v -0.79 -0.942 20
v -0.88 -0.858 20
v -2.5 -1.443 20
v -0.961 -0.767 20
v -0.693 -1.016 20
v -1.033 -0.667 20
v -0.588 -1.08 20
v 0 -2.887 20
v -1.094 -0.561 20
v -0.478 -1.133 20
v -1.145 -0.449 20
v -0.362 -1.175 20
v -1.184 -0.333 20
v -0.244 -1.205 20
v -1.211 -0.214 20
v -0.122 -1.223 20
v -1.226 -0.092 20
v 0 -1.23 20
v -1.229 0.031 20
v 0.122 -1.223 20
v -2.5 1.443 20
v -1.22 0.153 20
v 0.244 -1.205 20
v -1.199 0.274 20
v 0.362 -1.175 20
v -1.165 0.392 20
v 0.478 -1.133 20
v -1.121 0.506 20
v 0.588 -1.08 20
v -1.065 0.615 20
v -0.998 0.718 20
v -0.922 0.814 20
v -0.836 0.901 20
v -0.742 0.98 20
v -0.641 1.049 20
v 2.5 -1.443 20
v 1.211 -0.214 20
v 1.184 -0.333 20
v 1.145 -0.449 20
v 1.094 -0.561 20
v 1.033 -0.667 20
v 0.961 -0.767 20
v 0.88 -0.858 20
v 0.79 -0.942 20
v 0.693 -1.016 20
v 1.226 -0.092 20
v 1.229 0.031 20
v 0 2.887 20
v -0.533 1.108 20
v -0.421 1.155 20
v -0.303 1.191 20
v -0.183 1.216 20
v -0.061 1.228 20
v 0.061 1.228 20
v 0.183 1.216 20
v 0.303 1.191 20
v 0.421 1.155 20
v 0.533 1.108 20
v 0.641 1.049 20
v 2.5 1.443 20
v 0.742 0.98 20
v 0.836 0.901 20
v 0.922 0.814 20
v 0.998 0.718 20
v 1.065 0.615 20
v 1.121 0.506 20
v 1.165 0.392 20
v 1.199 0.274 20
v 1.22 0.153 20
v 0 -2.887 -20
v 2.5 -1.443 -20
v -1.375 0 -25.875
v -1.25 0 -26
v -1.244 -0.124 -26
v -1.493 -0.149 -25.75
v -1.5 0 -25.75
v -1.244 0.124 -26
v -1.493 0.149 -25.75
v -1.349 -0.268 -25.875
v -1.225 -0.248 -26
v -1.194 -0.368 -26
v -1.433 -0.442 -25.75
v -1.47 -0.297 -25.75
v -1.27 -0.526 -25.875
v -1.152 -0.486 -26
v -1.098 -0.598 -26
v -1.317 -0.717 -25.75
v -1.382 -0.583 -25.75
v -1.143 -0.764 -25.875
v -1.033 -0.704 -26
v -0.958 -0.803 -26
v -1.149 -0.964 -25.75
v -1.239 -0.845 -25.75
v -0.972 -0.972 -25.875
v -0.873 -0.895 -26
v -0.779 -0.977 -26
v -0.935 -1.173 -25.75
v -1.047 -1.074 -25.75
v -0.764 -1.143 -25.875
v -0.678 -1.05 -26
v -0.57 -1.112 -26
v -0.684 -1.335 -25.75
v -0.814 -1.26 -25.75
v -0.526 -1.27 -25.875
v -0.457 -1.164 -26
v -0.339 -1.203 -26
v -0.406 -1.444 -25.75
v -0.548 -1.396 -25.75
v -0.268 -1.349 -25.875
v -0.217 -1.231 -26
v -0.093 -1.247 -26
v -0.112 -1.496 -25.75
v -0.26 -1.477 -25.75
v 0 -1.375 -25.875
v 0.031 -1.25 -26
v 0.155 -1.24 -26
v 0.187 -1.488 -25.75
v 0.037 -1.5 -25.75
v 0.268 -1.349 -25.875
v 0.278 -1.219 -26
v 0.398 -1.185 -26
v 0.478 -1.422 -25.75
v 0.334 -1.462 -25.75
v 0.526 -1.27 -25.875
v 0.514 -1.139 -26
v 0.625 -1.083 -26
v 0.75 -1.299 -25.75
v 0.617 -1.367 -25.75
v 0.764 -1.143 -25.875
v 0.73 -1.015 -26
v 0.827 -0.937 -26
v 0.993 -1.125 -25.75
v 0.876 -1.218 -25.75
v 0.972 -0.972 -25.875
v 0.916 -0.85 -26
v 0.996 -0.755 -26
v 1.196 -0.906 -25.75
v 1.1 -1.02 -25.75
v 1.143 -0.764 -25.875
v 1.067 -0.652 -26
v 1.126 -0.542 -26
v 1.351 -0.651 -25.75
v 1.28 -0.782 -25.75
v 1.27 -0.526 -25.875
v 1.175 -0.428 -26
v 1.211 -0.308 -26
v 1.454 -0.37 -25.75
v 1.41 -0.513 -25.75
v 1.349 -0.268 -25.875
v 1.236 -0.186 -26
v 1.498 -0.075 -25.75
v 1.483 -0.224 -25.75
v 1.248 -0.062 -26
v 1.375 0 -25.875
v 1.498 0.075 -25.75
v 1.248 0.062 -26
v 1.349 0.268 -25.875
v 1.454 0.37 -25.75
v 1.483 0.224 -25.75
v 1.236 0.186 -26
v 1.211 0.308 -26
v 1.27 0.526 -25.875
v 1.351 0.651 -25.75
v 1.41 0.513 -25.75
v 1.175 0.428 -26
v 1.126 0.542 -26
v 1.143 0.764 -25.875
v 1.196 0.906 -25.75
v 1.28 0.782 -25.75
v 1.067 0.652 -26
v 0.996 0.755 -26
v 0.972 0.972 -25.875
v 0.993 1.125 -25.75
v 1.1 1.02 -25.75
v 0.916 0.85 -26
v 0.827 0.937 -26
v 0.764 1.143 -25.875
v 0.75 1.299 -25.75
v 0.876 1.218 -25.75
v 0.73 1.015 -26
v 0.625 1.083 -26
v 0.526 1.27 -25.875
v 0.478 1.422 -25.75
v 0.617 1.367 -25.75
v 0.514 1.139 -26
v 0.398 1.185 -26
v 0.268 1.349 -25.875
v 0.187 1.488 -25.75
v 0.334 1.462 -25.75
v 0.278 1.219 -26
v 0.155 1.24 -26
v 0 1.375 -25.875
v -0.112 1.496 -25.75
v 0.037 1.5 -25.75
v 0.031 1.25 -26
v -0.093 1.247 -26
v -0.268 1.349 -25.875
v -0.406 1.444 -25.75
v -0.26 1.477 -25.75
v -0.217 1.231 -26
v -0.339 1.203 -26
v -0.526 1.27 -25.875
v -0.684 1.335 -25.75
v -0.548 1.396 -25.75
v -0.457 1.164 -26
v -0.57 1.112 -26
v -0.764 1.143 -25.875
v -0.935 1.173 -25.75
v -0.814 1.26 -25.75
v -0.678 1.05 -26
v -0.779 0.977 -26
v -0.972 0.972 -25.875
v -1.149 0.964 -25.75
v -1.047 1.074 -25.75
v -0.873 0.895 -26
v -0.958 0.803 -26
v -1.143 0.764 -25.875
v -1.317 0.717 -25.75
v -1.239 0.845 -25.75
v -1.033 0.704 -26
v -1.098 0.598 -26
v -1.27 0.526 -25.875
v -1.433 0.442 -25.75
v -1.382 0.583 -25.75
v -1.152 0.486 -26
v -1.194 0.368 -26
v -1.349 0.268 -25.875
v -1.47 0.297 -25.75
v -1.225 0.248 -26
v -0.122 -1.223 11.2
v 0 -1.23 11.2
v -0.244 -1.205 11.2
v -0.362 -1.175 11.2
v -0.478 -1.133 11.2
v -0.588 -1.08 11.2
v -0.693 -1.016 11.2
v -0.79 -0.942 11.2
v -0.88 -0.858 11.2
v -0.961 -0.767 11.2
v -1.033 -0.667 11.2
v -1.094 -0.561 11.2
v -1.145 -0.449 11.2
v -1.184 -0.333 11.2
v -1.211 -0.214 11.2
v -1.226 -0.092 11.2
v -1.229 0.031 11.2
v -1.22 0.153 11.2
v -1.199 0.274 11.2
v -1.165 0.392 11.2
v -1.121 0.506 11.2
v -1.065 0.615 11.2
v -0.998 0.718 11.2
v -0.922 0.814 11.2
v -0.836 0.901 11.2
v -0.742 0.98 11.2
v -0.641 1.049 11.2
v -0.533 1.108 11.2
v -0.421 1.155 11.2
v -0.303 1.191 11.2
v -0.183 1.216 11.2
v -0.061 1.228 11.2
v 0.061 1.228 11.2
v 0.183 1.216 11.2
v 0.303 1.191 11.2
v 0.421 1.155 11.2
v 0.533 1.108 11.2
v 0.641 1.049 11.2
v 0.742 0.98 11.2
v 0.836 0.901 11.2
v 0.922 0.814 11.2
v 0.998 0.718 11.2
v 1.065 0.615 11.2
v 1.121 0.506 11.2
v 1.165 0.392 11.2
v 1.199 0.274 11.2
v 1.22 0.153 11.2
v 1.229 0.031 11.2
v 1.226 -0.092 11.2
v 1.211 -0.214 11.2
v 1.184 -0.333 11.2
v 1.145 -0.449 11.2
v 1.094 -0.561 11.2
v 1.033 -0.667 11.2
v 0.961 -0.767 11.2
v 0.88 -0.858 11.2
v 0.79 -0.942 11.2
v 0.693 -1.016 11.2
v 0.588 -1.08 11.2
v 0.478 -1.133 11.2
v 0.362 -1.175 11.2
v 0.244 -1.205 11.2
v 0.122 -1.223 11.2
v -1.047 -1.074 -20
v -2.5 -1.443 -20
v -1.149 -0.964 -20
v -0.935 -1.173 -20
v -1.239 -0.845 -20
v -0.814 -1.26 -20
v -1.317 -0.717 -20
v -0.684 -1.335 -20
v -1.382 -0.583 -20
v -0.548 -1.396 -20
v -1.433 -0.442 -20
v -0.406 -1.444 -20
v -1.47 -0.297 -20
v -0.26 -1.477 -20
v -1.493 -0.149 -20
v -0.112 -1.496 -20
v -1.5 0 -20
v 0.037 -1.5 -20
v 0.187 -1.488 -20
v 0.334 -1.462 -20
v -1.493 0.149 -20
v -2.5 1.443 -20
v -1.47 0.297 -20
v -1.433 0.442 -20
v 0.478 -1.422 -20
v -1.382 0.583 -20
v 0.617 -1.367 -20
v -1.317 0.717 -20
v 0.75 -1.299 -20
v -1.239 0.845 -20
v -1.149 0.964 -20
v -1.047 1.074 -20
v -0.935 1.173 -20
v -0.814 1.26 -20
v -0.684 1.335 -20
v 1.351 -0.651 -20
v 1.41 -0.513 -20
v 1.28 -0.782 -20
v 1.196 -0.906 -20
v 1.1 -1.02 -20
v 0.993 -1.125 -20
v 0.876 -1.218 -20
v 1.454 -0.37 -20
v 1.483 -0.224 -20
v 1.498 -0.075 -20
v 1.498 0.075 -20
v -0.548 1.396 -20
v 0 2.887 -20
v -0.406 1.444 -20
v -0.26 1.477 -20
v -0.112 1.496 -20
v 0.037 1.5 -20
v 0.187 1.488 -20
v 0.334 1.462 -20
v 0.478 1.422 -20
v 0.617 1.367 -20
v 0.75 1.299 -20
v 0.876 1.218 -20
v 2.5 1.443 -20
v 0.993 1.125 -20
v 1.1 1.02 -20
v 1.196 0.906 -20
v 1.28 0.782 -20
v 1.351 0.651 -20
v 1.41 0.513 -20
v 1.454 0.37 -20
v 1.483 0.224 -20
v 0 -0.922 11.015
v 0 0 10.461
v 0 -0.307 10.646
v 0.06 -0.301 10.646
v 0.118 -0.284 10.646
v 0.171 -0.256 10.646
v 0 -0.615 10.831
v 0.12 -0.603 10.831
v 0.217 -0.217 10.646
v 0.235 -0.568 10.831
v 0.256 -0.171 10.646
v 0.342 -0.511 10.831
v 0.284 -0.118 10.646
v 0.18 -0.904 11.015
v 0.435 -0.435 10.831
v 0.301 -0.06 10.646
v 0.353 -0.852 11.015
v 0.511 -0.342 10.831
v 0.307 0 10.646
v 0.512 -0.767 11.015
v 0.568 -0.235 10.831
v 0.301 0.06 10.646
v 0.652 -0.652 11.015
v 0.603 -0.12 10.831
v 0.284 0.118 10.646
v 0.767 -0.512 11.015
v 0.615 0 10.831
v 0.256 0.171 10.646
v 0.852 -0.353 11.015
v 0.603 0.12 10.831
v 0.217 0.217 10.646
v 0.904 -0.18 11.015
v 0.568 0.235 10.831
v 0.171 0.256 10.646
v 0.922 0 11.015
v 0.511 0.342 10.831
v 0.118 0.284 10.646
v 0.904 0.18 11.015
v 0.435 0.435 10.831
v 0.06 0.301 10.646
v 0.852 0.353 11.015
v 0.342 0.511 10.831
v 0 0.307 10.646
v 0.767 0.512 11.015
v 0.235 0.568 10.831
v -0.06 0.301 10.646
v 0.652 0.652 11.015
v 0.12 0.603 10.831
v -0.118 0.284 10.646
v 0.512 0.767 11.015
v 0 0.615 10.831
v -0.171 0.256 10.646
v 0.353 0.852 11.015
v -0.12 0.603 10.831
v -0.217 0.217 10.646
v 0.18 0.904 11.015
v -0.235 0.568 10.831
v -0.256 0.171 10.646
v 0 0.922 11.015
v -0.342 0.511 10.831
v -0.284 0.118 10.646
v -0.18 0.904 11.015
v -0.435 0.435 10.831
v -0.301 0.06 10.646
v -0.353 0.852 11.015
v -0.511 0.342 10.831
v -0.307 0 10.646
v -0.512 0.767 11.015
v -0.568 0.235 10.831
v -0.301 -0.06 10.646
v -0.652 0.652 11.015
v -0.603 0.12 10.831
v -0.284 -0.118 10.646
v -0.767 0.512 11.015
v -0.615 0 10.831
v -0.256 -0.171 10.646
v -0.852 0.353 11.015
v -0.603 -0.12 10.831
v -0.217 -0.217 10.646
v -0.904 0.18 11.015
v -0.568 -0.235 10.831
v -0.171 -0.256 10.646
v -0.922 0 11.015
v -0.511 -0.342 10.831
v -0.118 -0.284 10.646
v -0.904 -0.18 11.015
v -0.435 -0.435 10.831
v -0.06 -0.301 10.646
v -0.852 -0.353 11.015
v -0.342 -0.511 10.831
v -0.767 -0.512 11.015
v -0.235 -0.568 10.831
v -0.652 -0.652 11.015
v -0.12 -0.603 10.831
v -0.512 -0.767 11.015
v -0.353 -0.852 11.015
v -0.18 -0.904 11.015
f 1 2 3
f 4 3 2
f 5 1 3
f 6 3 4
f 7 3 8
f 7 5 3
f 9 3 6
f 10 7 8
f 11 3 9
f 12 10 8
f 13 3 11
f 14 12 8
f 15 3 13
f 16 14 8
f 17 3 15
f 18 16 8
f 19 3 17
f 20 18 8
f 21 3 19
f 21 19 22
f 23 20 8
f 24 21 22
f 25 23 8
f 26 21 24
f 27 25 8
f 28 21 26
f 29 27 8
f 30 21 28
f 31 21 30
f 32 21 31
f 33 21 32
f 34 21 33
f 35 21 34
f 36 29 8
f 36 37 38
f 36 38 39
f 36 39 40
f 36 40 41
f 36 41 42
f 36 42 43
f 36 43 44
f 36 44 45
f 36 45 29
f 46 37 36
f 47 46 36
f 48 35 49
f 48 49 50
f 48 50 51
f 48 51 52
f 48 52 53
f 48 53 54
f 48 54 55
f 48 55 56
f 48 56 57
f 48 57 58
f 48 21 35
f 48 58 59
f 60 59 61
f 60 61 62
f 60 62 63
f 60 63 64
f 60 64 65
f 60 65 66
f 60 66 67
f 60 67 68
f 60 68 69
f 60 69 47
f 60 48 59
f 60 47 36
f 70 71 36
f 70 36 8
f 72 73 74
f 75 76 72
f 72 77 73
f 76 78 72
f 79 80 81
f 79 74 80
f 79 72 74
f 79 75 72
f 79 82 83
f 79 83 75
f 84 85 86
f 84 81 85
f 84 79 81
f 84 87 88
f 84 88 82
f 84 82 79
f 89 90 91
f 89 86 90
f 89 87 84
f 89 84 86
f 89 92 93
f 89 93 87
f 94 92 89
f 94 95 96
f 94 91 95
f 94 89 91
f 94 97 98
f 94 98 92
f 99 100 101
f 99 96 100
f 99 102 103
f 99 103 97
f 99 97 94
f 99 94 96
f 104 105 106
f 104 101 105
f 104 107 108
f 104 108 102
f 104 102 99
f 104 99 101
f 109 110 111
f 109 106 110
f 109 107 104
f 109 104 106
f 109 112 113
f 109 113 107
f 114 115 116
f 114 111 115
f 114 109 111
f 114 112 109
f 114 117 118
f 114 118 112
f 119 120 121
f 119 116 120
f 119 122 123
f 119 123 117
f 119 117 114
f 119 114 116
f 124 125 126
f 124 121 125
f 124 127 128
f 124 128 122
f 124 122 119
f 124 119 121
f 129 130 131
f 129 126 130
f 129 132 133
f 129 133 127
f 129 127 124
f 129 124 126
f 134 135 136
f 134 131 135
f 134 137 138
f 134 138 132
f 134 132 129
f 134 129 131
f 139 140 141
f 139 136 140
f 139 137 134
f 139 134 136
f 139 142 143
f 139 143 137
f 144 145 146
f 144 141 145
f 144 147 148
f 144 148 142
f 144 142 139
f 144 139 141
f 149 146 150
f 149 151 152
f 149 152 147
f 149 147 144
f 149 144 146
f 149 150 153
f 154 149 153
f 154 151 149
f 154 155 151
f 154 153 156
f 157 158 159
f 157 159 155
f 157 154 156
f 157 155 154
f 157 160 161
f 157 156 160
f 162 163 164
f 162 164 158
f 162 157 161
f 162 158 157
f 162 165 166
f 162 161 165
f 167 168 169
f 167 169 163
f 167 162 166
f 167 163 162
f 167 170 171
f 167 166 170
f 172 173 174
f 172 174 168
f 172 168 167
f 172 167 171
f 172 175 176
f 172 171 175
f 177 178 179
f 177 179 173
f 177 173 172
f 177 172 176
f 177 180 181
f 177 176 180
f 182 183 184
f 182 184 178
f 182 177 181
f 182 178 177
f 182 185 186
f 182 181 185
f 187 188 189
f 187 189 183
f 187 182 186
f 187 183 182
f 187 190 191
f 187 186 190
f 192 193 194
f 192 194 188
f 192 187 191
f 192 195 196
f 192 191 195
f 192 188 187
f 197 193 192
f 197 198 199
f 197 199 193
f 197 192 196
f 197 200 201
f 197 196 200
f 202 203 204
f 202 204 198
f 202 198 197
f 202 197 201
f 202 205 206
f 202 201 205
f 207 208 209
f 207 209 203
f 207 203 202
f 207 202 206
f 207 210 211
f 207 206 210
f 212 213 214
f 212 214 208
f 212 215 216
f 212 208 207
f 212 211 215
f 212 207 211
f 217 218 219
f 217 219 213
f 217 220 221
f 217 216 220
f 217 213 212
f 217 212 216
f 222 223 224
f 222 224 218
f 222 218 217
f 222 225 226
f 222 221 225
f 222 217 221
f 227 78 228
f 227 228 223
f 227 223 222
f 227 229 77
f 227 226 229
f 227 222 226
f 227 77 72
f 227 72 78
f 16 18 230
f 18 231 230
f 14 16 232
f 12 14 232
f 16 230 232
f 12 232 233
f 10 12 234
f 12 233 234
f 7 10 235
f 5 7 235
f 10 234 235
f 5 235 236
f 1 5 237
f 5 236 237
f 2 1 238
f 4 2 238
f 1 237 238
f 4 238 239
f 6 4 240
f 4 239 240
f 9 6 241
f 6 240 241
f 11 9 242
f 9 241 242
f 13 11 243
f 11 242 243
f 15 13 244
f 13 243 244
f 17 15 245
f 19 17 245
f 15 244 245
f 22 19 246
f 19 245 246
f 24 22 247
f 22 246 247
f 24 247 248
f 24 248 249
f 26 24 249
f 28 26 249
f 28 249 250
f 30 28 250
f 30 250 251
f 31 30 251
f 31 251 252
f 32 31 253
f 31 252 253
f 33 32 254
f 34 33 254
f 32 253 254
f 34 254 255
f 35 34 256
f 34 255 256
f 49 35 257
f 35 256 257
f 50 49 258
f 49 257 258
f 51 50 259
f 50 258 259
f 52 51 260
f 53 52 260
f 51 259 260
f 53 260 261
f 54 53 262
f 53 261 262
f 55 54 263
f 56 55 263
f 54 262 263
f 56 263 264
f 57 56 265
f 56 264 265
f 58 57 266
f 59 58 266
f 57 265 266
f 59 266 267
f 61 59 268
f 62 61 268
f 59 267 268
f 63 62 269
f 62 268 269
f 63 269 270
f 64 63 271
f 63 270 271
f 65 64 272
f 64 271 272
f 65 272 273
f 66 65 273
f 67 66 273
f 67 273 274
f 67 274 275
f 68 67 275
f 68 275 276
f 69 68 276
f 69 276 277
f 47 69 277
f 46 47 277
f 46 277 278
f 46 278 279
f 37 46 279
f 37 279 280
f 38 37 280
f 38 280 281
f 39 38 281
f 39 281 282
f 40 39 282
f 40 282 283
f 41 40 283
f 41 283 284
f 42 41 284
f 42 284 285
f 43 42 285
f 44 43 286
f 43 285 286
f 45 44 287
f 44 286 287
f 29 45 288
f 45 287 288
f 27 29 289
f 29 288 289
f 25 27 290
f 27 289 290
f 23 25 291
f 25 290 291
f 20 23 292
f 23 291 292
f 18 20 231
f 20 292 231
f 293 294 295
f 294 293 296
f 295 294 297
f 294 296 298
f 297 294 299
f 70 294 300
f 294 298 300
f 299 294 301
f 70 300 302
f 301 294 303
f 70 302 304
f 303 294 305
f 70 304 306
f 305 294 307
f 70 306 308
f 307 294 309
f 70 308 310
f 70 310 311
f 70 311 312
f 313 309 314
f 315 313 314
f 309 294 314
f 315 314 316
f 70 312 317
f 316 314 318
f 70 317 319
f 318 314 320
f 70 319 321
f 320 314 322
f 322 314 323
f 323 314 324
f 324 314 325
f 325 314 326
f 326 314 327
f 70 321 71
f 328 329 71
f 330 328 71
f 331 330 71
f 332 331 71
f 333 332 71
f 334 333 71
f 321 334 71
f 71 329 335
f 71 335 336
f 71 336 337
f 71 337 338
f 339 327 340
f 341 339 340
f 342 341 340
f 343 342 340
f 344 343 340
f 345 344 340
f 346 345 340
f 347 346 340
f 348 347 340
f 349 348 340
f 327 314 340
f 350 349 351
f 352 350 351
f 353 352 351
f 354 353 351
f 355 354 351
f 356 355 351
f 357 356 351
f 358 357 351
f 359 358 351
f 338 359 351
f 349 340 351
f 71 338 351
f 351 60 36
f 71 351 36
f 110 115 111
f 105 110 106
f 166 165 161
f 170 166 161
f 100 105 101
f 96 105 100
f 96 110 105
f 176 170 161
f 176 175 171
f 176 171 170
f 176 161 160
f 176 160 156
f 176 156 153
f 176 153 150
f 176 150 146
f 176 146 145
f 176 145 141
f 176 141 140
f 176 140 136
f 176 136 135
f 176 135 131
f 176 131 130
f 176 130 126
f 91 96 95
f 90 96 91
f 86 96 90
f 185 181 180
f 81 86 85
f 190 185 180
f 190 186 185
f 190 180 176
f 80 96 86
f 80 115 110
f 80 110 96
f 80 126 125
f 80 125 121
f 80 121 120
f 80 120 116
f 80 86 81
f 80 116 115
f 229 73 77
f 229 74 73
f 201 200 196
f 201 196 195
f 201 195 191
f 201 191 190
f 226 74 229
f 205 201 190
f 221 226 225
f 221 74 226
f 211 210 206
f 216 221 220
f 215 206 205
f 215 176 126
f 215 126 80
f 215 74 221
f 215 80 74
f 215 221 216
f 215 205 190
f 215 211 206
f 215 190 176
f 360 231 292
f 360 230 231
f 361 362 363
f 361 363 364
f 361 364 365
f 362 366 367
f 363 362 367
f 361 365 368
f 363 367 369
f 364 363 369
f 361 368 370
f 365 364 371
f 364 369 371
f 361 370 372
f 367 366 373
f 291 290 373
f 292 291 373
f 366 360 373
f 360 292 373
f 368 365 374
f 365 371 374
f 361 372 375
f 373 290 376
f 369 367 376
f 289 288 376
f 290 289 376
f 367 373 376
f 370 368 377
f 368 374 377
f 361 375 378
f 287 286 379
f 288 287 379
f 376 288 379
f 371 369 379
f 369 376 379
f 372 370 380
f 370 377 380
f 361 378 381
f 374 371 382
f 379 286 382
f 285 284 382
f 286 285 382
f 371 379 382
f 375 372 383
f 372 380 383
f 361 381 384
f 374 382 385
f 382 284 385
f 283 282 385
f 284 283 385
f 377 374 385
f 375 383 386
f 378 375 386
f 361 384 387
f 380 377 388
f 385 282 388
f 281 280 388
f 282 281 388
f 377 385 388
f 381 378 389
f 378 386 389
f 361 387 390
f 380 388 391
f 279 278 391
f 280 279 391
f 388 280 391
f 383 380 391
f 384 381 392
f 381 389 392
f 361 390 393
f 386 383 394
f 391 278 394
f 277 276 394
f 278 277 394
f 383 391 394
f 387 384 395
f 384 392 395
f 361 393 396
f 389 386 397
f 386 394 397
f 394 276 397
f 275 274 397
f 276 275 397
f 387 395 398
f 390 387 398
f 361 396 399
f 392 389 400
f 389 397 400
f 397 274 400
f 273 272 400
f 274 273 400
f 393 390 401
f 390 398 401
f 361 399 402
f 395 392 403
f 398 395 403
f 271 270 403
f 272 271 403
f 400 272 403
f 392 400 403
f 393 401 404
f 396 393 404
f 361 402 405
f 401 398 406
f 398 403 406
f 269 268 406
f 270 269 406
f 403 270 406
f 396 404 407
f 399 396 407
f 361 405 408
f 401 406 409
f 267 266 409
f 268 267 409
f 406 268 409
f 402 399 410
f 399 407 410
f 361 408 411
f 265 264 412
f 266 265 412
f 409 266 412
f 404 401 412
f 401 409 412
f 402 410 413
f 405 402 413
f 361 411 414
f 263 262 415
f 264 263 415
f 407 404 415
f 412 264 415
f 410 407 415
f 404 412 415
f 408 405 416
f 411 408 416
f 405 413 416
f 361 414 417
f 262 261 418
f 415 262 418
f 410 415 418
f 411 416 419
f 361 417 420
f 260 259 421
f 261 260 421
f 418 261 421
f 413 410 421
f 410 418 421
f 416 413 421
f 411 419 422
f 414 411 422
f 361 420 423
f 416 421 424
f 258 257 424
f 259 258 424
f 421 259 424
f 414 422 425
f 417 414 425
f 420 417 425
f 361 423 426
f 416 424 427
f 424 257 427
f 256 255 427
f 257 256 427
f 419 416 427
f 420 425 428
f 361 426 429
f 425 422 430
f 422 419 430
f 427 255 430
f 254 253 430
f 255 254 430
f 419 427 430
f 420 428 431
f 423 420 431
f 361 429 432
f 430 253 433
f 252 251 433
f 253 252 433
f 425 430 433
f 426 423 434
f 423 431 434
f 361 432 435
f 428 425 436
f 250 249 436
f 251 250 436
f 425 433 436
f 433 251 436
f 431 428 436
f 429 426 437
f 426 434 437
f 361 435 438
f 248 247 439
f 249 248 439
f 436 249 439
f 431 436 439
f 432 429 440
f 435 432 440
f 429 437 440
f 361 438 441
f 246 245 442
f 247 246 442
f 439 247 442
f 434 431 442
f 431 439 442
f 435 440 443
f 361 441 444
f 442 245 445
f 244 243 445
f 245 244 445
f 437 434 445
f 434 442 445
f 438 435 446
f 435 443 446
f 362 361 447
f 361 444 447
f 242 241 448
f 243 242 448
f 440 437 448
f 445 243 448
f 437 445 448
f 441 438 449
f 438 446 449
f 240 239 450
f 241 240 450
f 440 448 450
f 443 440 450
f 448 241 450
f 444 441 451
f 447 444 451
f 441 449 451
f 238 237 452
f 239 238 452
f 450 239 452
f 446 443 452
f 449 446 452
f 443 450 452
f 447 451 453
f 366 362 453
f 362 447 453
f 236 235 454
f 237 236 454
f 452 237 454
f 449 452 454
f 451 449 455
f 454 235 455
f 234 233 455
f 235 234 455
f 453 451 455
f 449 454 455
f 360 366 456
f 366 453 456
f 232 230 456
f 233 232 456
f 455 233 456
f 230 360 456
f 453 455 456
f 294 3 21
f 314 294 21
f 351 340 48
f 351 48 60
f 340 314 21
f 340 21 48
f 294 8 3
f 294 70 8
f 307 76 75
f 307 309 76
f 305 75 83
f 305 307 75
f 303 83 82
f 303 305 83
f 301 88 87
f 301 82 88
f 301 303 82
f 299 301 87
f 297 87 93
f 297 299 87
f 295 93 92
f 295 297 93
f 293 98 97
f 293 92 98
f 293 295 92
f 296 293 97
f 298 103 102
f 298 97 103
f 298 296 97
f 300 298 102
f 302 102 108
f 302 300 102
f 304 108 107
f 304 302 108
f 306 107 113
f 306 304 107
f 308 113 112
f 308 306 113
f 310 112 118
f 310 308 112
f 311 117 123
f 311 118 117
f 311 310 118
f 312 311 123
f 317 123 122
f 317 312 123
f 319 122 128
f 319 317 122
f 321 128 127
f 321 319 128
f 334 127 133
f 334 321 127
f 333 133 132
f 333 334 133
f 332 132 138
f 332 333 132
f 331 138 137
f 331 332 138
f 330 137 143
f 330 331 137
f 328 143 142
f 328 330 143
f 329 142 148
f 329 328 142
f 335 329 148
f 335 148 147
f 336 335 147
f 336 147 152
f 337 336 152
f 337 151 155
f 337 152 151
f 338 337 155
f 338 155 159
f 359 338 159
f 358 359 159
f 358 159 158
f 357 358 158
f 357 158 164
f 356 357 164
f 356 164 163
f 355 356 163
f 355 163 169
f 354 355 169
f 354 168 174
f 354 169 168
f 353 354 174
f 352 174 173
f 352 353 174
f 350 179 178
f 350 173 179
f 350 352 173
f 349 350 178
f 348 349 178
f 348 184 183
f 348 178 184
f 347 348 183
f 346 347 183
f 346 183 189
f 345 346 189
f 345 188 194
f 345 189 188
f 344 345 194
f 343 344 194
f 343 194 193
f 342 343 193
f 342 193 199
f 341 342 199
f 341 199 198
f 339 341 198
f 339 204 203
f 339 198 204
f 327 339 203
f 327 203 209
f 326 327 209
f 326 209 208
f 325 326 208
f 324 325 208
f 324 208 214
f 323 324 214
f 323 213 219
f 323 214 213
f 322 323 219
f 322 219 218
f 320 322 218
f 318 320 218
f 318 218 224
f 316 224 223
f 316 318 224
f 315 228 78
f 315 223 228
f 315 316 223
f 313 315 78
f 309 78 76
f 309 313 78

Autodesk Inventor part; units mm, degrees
ref_plane "YZ Plane" through (0, 0, 0) normal (1, 0, 0) x (0, 1, 0)
ref_plane "XZ Plane" through (0, 0, 0) normal (0, 1, 0) x (-1, 0, 0)
ref_plane "XY Plane" through (0, 0, 0) normal (0, 0, 1) x (1, 0, 0)
sketch "Skizze1" plane through (0, 0, 0) normal (0, 0, 1) x (1, 0, 0)
  line L0 (-2.5, 1.4434) -> (0, 2.8868)
  line L1 (0, 2.8868) -> (2.5, 1.4434)
  line L2 (2.5, 1.4434) -> (2.5, -1.4434)
  line L3 (2.5, -1.4434) -> (0, -2.8868)
  line L4 (0, -2.8868) -> (-2.5, -1.4434)
  line L5 (-2.5, -1.4434) -> (-2.5, 1.4434)
  point P0 (0, 0)
  point P1 (0, 0)
  point P2 (0, 0)
  dimension "d2" = 5
extrude "Extrusion1" add sketch "Skizze1" along normal mid plane 40
sketch "Skizze3" plane through (0, 0, 20) normal (0, 0, 1) x (1, 0, 0)
  point P0 (0, 0)
  point P1 (0, 0)
hole "Bohrung1" at (0, 0, 20) direction (0, 0, -1) diameter 2.459 depth 8.8 tip angle 118 thread size "M3x0.5" class "6H" standard "ISO Metric profile"
sketch "Skizze4" plane through (0, 0, -20) normal (0, 0, -1) x (-1, 0, 0)
  circle A0 centre (0, 0) radius 1.5
  dimension "d17" = 3
extrude "Extrusion3" add sketch "Skizze4" along normal blind 6
thread "Gewinde2" size "M3x0.5" class "6g" standard "ISO Metric profile" full length
chamfer "Fase1" distance 0.25 angle 45 1 edges at (1.5, 0, -26)
properties part number "standoff (1466814)"
